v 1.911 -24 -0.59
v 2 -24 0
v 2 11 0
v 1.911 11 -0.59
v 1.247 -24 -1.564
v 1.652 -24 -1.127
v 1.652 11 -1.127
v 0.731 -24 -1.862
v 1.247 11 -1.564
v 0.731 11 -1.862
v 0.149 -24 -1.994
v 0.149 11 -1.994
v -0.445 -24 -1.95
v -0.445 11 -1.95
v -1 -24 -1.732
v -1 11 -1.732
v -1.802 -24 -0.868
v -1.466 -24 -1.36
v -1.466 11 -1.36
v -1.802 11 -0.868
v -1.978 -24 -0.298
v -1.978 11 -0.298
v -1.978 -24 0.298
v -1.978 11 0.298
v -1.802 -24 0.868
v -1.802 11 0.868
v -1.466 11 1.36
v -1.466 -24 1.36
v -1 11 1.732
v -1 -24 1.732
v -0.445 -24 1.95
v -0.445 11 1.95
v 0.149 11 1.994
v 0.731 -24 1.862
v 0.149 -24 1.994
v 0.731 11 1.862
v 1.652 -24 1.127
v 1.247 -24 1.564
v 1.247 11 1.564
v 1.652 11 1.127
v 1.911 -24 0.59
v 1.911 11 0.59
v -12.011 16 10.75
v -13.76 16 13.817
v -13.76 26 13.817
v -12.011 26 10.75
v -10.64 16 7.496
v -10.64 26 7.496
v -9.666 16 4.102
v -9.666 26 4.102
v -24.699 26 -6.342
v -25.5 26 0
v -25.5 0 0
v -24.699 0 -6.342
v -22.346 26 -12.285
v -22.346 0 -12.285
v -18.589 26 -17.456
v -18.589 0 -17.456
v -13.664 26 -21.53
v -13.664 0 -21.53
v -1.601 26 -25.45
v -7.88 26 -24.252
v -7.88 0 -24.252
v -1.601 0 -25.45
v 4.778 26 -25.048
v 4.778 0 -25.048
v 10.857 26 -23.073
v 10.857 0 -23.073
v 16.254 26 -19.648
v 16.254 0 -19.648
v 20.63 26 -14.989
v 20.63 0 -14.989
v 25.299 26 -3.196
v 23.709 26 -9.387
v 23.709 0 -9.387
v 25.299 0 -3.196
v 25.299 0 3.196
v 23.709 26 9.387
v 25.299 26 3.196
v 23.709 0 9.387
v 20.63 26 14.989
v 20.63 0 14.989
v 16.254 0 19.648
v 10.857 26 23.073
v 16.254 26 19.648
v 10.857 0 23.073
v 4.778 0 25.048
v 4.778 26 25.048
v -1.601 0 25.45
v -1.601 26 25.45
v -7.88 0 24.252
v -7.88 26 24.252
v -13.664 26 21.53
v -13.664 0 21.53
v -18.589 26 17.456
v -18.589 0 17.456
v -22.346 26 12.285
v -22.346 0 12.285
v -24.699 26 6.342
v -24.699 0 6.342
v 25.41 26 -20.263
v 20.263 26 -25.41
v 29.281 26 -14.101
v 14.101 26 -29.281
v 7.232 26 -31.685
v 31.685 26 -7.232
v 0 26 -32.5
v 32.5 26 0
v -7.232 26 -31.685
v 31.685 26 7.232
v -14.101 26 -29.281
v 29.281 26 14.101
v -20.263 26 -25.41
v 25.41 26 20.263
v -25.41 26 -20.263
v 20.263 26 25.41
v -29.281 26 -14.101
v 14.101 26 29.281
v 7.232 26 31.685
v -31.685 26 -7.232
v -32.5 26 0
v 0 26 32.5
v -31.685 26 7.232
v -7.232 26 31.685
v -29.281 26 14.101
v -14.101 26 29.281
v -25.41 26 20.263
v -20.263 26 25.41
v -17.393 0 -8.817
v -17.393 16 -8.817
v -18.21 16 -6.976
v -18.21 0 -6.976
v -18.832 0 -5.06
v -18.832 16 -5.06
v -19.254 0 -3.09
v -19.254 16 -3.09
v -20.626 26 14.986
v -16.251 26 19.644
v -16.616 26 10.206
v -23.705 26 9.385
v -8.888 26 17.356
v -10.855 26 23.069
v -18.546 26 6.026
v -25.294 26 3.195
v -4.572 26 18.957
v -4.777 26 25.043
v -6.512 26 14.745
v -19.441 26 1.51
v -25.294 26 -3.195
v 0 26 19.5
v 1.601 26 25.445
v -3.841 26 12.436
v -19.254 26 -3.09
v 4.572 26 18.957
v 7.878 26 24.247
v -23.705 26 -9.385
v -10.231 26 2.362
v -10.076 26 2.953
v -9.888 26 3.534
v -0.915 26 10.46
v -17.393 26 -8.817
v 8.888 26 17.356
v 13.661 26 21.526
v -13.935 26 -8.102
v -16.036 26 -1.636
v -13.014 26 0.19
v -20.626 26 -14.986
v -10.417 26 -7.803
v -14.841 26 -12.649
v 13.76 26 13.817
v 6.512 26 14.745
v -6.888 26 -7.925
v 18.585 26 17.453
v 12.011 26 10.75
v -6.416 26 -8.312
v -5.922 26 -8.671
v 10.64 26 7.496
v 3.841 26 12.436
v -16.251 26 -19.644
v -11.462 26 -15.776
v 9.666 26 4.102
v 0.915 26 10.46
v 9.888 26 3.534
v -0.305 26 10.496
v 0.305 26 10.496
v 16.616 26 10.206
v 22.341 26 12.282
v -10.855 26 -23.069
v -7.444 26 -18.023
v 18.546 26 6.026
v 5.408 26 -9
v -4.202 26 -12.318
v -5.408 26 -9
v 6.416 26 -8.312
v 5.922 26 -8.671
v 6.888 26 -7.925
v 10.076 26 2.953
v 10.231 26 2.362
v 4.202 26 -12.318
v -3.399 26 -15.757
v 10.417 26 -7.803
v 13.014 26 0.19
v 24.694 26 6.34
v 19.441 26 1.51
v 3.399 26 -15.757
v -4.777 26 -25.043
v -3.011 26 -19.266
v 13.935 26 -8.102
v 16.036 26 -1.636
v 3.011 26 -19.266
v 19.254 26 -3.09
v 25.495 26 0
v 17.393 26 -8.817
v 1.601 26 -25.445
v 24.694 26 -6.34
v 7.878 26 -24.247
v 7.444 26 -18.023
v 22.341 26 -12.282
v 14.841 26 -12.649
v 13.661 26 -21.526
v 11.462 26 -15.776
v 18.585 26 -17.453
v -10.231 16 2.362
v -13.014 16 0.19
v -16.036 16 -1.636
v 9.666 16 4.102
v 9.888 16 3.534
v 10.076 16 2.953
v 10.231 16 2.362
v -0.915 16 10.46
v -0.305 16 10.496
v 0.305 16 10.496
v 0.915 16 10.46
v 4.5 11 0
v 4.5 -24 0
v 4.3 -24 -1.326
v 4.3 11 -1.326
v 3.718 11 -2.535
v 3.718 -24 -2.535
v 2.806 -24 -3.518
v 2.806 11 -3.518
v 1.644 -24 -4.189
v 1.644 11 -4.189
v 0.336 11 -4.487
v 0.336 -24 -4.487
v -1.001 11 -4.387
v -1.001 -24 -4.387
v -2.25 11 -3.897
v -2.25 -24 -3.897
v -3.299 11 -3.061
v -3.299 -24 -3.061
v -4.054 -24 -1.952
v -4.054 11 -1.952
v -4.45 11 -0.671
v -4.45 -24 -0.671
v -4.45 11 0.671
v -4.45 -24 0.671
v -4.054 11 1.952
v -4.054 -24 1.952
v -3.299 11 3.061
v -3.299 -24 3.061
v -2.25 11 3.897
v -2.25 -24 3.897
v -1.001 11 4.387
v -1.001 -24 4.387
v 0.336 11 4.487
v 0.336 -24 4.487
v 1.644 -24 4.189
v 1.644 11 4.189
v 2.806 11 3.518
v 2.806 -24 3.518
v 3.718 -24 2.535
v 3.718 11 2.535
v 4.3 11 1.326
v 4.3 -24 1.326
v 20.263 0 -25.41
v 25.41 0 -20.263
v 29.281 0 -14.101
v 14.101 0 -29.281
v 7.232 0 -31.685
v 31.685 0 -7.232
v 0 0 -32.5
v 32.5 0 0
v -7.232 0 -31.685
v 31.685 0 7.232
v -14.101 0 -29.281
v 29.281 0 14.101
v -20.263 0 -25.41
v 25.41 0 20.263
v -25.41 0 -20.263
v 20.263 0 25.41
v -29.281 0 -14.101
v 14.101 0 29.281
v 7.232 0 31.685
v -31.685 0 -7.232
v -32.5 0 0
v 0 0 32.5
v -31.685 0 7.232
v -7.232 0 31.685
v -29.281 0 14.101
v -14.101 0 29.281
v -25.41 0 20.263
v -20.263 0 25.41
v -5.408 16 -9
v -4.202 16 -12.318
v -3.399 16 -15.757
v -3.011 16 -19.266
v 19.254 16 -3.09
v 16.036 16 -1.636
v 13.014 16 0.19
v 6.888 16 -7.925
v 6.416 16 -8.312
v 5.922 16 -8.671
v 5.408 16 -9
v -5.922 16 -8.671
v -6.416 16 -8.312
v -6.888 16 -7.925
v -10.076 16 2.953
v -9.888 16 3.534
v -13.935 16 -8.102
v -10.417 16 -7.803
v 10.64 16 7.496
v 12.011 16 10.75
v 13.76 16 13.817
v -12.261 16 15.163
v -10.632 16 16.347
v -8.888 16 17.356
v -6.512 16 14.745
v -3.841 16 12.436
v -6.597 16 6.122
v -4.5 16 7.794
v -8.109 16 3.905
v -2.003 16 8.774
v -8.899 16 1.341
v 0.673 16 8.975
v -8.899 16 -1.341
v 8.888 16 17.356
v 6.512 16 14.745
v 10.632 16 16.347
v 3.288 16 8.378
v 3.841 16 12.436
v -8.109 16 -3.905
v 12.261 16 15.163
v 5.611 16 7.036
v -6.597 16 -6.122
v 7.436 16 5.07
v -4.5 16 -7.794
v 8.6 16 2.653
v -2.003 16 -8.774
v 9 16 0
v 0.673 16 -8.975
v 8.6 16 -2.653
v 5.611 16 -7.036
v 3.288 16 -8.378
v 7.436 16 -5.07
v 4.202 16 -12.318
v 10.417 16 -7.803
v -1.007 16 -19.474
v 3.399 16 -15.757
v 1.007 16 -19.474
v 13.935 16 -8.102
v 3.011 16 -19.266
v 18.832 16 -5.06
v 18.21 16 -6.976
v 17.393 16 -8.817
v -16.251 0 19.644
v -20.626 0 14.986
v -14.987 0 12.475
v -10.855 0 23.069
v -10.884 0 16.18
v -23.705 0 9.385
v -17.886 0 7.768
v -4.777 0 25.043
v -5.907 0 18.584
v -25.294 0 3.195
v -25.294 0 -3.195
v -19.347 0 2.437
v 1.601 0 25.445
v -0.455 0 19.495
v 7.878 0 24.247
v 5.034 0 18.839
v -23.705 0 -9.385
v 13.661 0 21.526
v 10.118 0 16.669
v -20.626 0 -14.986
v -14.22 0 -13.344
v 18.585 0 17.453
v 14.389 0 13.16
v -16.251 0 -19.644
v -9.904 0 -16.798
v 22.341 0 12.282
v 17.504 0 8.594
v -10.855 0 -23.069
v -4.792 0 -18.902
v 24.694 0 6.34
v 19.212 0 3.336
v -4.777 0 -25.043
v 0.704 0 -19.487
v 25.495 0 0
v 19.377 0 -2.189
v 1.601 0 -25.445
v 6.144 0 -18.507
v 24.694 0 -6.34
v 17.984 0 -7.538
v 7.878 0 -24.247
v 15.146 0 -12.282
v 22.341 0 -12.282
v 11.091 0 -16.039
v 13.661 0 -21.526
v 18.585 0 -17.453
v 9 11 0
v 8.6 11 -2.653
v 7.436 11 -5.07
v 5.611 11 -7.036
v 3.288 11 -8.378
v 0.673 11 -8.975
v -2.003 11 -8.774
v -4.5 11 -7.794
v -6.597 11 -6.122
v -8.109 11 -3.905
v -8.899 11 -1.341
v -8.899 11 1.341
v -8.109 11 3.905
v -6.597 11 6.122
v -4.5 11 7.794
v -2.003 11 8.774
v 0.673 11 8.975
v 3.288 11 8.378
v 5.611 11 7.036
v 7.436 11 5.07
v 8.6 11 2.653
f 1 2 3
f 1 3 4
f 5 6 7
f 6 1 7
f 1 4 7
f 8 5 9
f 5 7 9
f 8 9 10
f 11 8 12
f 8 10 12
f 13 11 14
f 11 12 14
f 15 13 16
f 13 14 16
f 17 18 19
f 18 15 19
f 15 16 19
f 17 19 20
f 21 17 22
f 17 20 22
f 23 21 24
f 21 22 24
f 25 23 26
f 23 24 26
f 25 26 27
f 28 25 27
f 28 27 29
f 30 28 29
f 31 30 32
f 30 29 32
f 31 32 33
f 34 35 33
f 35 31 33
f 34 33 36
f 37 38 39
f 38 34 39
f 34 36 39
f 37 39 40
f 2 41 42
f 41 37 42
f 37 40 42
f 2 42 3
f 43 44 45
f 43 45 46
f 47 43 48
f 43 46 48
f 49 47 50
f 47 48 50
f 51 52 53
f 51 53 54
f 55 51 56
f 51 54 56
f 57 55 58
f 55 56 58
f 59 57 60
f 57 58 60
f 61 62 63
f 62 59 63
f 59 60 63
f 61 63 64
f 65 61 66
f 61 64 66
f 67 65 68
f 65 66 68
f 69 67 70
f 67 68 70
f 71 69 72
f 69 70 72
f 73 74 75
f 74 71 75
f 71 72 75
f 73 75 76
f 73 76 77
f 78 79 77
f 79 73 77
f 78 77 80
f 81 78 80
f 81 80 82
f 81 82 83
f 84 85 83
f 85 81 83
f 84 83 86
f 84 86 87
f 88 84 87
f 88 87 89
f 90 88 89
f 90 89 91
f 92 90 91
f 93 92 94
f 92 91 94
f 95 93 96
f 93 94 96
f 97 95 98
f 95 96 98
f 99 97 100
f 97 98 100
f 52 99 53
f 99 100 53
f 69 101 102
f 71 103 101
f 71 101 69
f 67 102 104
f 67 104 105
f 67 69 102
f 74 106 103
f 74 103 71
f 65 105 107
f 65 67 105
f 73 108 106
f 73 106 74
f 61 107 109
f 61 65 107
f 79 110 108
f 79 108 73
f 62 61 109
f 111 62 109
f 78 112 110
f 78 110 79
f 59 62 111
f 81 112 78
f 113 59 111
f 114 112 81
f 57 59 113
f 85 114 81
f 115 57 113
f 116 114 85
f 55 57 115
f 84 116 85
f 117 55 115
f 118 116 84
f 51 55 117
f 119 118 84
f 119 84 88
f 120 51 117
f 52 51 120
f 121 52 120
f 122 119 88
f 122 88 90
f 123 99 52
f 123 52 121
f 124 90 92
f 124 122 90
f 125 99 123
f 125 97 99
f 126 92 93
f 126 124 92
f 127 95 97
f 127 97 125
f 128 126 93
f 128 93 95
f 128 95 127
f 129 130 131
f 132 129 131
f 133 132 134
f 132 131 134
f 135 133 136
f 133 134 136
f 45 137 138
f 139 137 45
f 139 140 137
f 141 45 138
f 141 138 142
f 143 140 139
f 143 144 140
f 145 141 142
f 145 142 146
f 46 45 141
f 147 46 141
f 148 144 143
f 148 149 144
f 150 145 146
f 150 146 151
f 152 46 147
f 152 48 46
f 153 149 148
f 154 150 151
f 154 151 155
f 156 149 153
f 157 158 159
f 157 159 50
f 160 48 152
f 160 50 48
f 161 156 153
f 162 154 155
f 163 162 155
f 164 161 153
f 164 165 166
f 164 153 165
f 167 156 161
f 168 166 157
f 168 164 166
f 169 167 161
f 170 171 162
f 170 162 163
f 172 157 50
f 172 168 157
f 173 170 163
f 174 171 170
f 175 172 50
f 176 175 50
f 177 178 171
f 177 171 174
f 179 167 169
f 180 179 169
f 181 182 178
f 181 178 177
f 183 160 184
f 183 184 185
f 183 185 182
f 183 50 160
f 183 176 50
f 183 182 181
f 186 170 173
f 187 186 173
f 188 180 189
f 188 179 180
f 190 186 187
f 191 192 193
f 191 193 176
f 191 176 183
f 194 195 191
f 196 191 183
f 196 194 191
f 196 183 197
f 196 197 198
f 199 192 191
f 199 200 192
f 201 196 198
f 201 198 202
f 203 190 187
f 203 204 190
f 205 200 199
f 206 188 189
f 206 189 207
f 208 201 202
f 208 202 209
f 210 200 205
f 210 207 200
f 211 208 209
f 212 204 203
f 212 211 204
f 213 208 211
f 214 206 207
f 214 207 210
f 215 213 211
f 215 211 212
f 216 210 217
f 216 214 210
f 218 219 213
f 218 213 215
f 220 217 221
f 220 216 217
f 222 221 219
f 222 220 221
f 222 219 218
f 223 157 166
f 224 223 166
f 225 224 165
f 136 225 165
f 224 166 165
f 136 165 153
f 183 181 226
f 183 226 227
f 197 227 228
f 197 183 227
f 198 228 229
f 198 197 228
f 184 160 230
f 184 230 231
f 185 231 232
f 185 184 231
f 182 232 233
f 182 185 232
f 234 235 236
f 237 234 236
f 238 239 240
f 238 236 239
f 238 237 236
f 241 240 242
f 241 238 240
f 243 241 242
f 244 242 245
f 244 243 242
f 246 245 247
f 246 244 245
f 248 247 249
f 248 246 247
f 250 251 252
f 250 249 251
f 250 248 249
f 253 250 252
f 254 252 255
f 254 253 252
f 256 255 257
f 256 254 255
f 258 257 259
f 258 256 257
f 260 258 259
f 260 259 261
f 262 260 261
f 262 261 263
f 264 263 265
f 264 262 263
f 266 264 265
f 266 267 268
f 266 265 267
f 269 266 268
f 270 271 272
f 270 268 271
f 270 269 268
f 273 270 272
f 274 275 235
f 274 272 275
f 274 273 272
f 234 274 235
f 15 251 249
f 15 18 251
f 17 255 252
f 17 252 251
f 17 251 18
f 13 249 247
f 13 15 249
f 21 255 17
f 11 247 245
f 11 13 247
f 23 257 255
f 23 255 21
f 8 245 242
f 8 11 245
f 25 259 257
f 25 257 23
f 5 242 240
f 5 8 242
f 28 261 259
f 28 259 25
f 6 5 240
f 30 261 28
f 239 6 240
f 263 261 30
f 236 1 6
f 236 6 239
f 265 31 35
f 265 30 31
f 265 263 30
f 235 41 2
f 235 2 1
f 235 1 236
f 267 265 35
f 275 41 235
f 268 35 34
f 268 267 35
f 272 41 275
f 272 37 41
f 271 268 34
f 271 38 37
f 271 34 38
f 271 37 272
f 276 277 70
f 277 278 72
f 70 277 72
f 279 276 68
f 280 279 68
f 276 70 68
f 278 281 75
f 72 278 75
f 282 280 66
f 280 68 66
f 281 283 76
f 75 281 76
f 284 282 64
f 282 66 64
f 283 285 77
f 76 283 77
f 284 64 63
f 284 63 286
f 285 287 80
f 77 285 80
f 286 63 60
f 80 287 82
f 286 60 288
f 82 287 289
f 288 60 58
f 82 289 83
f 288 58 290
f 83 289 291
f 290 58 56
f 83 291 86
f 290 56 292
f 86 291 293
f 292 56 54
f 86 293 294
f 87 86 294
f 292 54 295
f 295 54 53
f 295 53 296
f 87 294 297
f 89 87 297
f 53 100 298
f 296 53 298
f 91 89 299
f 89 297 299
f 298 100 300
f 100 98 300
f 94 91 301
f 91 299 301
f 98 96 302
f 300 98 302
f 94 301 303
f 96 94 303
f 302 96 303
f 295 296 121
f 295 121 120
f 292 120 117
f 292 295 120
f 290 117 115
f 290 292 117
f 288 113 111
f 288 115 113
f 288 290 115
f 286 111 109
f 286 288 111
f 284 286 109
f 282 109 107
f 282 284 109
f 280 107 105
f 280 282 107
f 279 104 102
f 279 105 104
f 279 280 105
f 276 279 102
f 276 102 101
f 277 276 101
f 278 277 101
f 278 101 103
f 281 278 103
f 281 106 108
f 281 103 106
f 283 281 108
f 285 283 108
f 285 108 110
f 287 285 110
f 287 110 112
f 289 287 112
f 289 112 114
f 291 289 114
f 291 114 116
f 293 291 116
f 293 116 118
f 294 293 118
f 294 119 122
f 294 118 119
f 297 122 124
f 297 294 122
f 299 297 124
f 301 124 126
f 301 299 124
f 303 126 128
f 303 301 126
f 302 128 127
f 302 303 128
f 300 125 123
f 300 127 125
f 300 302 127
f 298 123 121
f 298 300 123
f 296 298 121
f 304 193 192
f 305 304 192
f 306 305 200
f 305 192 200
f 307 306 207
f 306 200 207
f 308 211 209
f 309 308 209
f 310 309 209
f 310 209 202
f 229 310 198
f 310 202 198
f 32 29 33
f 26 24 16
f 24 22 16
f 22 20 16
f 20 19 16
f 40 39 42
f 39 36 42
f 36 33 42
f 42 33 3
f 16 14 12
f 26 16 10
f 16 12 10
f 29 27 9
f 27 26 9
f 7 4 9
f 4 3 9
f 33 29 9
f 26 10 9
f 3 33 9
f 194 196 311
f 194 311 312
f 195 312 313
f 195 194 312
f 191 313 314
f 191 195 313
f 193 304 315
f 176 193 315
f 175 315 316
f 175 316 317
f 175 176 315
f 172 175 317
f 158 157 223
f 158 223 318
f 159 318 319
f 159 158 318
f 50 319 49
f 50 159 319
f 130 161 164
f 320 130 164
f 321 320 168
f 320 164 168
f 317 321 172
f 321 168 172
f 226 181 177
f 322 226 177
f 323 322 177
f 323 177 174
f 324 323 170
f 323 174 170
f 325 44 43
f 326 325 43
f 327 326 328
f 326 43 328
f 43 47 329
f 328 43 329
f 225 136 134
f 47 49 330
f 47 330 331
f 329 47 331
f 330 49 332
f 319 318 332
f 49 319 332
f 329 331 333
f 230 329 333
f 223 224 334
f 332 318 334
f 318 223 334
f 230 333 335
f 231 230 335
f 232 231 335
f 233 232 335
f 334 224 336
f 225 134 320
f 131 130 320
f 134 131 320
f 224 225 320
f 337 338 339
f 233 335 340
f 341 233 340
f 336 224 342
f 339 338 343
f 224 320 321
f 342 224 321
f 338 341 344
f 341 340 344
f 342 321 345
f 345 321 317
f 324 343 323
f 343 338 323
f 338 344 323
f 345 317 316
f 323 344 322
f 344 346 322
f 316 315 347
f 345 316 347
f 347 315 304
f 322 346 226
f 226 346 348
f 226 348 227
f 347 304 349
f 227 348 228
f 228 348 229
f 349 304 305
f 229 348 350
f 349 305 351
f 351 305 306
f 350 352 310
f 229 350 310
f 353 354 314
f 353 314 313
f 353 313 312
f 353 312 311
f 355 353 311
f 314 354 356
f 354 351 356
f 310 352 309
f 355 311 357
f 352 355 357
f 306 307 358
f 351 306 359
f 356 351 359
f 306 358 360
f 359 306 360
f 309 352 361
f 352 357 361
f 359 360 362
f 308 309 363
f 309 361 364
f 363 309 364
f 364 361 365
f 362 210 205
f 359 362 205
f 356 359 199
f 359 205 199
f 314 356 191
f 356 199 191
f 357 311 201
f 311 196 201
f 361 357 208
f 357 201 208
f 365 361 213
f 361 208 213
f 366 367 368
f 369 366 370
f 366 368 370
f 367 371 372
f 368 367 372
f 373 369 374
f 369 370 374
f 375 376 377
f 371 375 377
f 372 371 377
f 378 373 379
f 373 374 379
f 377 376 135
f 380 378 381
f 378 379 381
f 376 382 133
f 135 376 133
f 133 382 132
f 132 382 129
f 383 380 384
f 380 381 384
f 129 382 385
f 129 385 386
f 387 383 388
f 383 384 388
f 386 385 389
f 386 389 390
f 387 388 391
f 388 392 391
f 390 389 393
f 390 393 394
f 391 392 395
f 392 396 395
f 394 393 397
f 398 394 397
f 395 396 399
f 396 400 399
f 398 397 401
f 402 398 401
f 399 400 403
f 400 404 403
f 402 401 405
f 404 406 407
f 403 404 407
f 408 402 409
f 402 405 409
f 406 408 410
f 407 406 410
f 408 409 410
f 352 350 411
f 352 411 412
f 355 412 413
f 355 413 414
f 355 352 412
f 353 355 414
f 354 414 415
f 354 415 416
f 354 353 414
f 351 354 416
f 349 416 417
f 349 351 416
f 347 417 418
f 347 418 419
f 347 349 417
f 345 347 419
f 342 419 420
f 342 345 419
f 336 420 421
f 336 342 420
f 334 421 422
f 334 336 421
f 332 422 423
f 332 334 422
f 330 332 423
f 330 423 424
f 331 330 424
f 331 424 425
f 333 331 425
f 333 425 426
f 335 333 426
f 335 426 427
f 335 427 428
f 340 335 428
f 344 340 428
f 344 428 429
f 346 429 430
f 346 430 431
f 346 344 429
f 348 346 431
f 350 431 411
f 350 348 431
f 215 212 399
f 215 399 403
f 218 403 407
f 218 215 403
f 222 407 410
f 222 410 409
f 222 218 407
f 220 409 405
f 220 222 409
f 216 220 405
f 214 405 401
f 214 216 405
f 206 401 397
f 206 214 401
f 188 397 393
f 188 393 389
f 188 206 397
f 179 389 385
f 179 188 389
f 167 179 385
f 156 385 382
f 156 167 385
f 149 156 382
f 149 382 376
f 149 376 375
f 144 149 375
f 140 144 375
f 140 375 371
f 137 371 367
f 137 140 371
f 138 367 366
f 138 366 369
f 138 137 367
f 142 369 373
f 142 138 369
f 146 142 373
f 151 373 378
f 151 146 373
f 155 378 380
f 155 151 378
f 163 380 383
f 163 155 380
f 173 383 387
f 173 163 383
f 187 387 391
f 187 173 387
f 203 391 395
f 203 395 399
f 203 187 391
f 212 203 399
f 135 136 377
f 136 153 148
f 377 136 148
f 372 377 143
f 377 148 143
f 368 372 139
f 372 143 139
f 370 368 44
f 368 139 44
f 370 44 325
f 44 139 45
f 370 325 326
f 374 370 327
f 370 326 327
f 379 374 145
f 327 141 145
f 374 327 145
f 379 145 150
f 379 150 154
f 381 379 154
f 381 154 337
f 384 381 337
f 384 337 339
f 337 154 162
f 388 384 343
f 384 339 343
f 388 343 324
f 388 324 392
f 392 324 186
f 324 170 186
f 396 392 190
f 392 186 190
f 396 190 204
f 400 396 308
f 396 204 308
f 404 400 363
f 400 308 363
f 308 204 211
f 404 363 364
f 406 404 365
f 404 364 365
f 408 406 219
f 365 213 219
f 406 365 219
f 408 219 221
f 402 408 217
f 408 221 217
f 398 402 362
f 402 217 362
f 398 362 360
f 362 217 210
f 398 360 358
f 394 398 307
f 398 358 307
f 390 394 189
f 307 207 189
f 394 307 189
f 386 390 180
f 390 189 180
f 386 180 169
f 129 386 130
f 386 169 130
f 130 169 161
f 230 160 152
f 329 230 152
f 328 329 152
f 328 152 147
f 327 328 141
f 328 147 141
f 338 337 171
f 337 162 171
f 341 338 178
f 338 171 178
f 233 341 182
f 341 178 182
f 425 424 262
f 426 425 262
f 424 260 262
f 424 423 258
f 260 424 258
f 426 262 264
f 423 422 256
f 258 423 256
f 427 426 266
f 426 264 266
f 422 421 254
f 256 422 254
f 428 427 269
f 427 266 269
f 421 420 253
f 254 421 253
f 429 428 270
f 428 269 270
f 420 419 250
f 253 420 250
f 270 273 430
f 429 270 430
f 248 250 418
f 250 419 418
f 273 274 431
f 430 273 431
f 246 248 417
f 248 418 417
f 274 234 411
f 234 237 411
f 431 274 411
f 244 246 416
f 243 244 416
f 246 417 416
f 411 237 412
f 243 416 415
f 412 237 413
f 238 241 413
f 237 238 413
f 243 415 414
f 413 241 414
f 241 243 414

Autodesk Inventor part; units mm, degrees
ref_plane "YZ Plane" through (0, 0, 0) normal (1, 0, 0) x (0, 1, 0)
ref_plane "XZ Plane" through (0, 0, 0) normal (0, 1, 0) x (-1, 0, 0)
ref_plane "XY Plane" through (0, 0, 0) normal (0, 0, 1) x (1, 0, 0)
sketch "Sketch1" plane through (0, 0, 0) normal (0, 1, 0) x (-1, 0, 0)
  circle A0 centre (0, 0) radius 32.5
  circle A1 centre (0, 0) radius 25.5
  dimension "d0" = 65
  dimension "d1" = 51
extrude "Extrusion1" add sketch "Sketch1" along normal blind 26
sketch "Sketch2" plane through (0, 26, 0) normal (0, 1, 0) x (1, 0, 0)
  circle A0 centre (0, 0) radius 9
  arc A1 (-5.4083, 9) -> (-3.0109, 19.2661) centre (-32.5925, 20.7613) ccw
  arc A2 (3.0109, 19.2661) -> (5.4083, 9) centre (32.5925, 20.7613) ccw
  arc A3 (-10.2308, -2.3625) -> (-19.2536, 3.09) centre (-29.8168, -24.5817) ccw
  arc A4 (-17.3928, 8.8171) -> (-6.8882, 7.9248) centre (-9.6735, 37.4129) ccw
  arc A5 (-0.9146, -10.4601) -> (-8.8885, -17.3564) centre (14.1647, -35.9536) ccw
  arc A6 (-13.7602, -13.8169) -> (-9.6655, -4.1022) centre (-38.5711, 2.3612) ccw
  arc A7 (9.6655, -4.1022) -> (13.7602, -13.8169) centre (38.5711, 2.3612) ccw
  arc A8 (8.8885, -17.3564) -> (0.9146, -10.4601) centre (-14.1647, -35.9536) ccw
  arc A9 (6.8882, 7.9248) -> (17.3928, 8.8171) centre (9.6735, 37.4129) ccw
  arc A10 (19.2536, 3.09) -> (10.2308, -2.3625) centre (29.8168, -24.5817) ccw
  arc A11 (-3.0109, 19.2661) -> (-17.3928, 8.8171) centre (0, 0) ccw
  arc A12 (-19.2536, 3.09) -> (-13.7602, -13.8169) centre (0, 0) ccw
  arc A13 (-8.8885, -17.3564) -> (8.8885, -17.3564) centre (0, 0) ccw
  arc A14 (13.7602, -13.8169) -> (19.2536, 3.09) centre (0, 0) ccw
  arc A15 (17.3928, 8.8171) -> (3.0109, 19.2661) centre (0, 0) ccw
  arc A16 (-5.4083, 9) -> (-6.8882, 7.9248) centre (0, 0) ccw
  arc A17 (-10.2308, -2.3625) -> (-9.6655, -4.1022) centre (0, 0) ccw
  arc A18 (-0.9146, -10.4601) -> (0.9146, -10.4601) centre (0, 0) ccw
  arc A19 (9.6655, -4.1022) -> (10.2308, -2.3625) centre (0, 0) ccw
  arc A20 (6.8882, 7.9248) -> (5.4083, 9) centre (0, 0) ccw
  circle A21 centre (0, 0) radius 25.45
  circle A22 centre (0, 0) radius 19.5
  point P0 (-17.3928, 8.8171)
  point P1 (-19.2536, 3.09)
  point P2 (-8.8885, -17.3564)
  point P3 (8.8885, -17.3564)
  point P4 (13.7602, -13.8169)
  point P5 (19.2536, 3.09)
  point P6 (17.3928, 8.8171)
  point P7 (-3.0109, 19.2661)
  dimension "d6" = 18
  dimension "d11" = 360
  dimension "d15" = 50.9
extrude "Extrusion3" add sketch "Sketch2" against normal blind 10 contours A1 A22 A2 A20 A9 A10 A19 A7 A8 A18 A5 A6 A17 A3 A4 A16
sketch "Sketch3" plane through (0, 26, 0) normal (0, 1, 0) x (1, 0, 0)
  arc A0 (-17.3928, 8.8171) -> (-19.2536, 3.09) centre (0, 0) ccw projected
  circle A1 centre (0, 0) radius 19.5
  circle A2 centre (0, 0) radius 25.495
  point P0 (-17.3928, 8.8171)
  dimension "d18" = 50.99
extrude "Extrusion4" add sketch "Sketch3" against normal up to surface (26 mm away)
sketch "Sketch4" plane through (0, 26, 0) normal (0, 1, 0) x (1, 0, 0)
  circle A0 centre (0, 0) radius 9
extrude "Extrusion5" add sketch "Sketch4" against normal blind 15
sketch "Sketch5" plane through (0, 11, 0) normal (0, -1, 0) x (1, 0, 0)
  circle A0 centre (0, 0) radius 2
  circle A1 centre (0, 0) radius 4.5
  dimension "d23" = 4
  dimension "d24" = 9
extrude "Extrusion6" add sketch "Sketch5" along normal blind 35
properties part number "mock_wheel"
